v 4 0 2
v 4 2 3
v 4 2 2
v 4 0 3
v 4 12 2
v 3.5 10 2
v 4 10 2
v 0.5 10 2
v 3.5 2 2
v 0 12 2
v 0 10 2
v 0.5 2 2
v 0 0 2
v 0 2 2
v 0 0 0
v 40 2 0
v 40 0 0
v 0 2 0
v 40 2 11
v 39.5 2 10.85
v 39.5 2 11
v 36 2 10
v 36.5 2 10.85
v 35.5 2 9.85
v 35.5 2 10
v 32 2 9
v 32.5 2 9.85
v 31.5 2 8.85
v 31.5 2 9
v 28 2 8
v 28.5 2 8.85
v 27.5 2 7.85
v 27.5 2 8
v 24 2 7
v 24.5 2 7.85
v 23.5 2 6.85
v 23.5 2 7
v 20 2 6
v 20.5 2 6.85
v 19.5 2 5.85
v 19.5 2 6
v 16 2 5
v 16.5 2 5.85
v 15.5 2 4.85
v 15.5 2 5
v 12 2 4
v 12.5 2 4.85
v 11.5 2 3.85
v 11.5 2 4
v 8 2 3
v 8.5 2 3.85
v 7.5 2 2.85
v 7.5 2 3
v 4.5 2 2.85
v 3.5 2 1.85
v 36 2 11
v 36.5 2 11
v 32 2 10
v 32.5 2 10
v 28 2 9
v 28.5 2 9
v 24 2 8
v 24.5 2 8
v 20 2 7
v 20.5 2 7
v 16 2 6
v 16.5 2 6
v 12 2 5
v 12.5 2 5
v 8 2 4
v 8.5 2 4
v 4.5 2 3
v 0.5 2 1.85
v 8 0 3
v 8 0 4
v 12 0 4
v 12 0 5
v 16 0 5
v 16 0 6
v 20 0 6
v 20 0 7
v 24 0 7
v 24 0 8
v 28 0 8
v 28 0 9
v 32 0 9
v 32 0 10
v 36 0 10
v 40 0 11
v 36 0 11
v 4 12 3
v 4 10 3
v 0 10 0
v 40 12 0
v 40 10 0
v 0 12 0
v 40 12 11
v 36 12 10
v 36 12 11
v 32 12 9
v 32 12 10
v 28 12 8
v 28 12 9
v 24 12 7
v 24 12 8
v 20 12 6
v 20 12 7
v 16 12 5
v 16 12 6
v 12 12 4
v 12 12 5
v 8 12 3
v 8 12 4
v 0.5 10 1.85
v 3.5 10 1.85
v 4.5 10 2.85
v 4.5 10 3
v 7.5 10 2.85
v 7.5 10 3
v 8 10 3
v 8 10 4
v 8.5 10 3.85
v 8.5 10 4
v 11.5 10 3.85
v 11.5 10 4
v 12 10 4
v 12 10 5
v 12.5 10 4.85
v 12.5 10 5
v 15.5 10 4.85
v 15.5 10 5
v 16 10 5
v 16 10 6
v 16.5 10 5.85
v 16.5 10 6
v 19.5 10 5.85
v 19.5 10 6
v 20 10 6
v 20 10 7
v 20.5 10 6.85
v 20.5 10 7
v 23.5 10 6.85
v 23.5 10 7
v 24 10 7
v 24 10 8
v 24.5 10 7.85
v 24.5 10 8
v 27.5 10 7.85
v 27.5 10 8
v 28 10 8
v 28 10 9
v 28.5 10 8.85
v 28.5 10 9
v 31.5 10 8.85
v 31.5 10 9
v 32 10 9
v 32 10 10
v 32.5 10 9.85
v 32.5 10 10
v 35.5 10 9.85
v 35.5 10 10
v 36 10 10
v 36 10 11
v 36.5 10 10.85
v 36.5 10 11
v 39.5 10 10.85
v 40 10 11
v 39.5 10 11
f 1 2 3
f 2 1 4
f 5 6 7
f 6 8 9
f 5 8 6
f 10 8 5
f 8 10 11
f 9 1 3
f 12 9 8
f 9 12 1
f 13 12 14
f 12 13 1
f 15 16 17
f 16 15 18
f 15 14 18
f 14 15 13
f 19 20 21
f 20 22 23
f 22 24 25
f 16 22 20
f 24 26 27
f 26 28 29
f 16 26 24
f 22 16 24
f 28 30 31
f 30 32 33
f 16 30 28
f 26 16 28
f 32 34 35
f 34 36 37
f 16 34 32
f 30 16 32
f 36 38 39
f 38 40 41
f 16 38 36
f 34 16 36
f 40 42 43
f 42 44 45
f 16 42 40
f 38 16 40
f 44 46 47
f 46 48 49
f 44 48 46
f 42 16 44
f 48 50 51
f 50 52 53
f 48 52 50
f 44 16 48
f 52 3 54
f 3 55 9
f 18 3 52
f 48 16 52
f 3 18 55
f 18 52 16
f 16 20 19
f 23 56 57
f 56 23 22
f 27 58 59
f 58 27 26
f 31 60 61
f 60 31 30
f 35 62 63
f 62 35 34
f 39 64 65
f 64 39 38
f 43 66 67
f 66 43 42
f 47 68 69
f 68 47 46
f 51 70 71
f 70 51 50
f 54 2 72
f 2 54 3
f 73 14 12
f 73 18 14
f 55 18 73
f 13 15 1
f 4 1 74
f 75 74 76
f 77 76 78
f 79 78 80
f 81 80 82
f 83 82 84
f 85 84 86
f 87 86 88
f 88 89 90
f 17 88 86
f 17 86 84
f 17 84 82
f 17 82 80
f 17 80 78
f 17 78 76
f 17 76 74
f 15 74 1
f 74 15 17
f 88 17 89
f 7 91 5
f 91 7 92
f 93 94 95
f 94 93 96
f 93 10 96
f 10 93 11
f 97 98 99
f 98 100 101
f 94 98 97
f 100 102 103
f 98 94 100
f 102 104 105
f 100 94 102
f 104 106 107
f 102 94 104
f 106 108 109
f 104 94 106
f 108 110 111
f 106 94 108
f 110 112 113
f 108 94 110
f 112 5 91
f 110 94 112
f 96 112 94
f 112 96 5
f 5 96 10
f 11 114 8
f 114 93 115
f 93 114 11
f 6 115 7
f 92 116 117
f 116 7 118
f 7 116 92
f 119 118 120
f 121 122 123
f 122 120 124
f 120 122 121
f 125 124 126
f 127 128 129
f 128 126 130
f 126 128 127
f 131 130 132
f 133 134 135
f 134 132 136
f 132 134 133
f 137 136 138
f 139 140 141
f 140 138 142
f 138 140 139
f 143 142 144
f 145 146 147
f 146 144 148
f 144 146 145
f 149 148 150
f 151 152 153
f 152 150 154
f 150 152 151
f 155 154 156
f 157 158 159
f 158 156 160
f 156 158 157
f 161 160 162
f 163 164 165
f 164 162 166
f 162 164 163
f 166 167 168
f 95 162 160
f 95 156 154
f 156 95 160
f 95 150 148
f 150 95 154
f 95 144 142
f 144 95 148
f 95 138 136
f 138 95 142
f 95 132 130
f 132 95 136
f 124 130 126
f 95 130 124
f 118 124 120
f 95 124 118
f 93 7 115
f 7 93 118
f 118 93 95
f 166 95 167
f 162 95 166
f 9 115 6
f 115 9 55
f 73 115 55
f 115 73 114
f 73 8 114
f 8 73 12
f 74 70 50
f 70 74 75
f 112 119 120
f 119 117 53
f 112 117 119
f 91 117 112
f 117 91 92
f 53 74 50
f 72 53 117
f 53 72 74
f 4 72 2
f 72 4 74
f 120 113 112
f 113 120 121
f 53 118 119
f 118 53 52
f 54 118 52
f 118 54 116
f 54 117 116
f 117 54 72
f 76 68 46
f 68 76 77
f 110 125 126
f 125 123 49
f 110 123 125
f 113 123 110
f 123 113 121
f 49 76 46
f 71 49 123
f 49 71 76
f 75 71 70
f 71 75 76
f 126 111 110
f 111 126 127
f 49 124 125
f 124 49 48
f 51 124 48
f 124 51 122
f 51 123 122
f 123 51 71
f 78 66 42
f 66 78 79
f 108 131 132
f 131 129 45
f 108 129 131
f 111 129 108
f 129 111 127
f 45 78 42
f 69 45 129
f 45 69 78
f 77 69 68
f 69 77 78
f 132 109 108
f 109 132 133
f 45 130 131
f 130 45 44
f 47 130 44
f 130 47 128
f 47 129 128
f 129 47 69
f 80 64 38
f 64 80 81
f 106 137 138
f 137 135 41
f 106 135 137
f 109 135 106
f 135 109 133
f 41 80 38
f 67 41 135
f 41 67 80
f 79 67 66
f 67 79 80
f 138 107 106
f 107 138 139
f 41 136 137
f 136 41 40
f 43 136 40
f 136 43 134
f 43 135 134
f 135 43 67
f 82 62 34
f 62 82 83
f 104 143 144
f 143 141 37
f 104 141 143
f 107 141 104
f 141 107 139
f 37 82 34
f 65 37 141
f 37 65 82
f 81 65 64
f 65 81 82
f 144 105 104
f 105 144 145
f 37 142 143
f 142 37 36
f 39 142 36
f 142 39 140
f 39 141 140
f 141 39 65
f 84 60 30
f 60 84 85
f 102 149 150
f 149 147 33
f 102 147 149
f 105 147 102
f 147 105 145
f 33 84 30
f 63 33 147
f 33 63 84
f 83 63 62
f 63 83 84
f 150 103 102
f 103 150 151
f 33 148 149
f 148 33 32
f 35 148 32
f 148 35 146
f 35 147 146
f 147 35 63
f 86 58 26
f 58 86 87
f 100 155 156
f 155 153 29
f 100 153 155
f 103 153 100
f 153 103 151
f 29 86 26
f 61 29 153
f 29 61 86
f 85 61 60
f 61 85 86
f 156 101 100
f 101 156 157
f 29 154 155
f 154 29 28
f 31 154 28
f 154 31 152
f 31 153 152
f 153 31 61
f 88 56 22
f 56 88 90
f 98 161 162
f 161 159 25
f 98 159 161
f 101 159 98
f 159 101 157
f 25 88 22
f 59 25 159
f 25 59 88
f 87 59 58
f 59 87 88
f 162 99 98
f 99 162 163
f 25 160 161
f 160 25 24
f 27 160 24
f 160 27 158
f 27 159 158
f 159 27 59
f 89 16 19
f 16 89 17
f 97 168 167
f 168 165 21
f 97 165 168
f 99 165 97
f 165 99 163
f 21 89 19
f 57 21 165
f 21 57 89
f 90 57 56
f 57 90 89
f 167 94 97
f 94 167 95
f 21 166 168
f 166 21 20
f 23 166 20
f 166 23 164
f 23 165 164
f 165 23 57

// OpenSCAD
for (i=[0:9]) {
   translate([i*4,0,0]) {
      cube([4,2,i+2]);
      translate([0,10,0]) cube([4,2,i+2]);
      translate([0.5,0,i+2-0.15]) cube([3,11,0.15]);
   }
}
